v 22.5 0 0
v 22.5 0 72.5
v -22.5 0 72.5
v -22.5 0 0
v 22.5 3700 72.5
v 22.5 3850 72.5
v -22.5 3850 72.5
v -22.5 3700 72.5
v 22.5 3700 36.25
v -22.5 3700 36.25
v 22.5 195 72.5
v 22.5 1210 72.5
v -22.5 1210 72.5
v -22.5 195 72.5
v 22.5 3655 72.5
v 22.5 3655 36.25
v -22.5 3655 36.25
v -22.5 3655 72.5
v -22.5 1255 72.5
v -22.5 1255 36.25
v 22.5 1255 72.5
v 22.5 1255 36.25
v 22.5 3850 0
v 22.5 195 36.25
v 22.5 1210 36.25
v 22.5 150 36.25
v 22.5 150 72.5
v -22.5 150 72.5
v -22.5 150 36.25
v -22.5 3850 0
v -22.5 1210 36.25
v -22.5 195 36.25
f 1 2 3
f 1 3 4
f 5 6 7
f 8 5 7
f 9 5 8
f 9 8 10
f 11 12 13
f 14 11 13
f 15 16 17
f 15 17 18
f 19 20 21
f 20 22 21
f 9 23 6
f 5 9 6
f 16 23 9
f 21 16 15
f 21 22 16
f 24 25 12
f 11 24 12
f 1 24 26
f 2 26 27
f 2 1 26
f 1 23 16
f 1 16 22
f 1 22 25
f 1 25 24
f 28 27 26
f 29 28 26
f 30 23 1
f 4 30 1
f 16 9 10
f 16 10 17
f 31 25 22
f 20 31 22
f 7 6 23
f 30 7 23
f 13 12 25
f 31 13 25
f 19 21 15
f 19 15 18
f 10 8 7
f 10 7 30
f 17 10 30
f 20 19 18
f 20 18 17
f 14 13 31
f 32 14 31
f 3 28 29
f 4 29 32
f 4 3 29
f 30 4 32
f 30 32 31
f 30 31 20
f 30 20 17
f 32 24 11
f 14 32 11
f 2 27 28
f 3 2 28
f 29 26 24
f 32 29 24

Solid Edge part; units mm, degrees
sketch "Sketch1" plane through (0, 0, 0) normal (0, -1, 0) x (1, 0, 0)
  line L0 (-22.5, -72.5) -> (22.5, -72.5)
  line L1 (22.5, -72.5) -> (22.5, 72.5)
  line L2 (22.5, 72.5) -> (-22.5, 72.5)
  line L3 (-22.5, 72.5) -> (-22.5, -72.5)
extrude "Protrusion1" add sketch "Sketch1" against normal blind 3850
sketch "Sketch2" plane through (22.5, 1925, 0) normal (1, 0, 0) x (0, 1, 0)
  line L0 (1775, 72.5) -> (1775, 36.25)
  line L1 (1775, 36.25) -> (1730, 36.25)
  line L2 (1730, 36.25) -> (1730, 72.5)
  line L3 (1730, 72.5) -> (1775, 72.5)
  line L4 (-1775, 72.5) -> (-1775, 36.25)
  line L5 (-1775, 36.25) -> (-1730, 36.25)
  line L6 (-1730, 36.25) -> (-1730, 72.5)
  line L7 (-1730, 72.5) -> (-1775, 72.5)
extrude "ExtrudedCutout_1" cut sketch "Sketch2" against normal blind 86.6929
sketch "Sketch3" plane through (22.5, 1925, 0) normal (1, 0, 0) x (0, 1, 0)
  line L0 (-1925, -72.5) -> (1925, -72.5)
  line L1 (1925, -72.5) -> (1925, 0)
  line L2 (1925, 0) -> (-1925, 0)
  line L3 (-1925, 0) -> (-1925, -72.5)
extrude "ExtrudedCutout_2" cut sketch "Sketch3" against normal blind 2000.7732
sketch "Sketch4" plane through (22.5, 1925, 36.25) normal (1, 0, 0) x (0, 1, 0)
  line L0 (-715, 36.25) -> (-715, 0)
  line L1 (-715, 0) -> (-670, 0)
  line L2 (-670, 0) -> (-670, 36.25)
  line L3 (-670, 36.25) -> (-715, 36.25)
extrude "ExtrudedCutout_3" cut sketch "Sketch4" against normal blind 168.4224
properties material "Wood, Pine"
